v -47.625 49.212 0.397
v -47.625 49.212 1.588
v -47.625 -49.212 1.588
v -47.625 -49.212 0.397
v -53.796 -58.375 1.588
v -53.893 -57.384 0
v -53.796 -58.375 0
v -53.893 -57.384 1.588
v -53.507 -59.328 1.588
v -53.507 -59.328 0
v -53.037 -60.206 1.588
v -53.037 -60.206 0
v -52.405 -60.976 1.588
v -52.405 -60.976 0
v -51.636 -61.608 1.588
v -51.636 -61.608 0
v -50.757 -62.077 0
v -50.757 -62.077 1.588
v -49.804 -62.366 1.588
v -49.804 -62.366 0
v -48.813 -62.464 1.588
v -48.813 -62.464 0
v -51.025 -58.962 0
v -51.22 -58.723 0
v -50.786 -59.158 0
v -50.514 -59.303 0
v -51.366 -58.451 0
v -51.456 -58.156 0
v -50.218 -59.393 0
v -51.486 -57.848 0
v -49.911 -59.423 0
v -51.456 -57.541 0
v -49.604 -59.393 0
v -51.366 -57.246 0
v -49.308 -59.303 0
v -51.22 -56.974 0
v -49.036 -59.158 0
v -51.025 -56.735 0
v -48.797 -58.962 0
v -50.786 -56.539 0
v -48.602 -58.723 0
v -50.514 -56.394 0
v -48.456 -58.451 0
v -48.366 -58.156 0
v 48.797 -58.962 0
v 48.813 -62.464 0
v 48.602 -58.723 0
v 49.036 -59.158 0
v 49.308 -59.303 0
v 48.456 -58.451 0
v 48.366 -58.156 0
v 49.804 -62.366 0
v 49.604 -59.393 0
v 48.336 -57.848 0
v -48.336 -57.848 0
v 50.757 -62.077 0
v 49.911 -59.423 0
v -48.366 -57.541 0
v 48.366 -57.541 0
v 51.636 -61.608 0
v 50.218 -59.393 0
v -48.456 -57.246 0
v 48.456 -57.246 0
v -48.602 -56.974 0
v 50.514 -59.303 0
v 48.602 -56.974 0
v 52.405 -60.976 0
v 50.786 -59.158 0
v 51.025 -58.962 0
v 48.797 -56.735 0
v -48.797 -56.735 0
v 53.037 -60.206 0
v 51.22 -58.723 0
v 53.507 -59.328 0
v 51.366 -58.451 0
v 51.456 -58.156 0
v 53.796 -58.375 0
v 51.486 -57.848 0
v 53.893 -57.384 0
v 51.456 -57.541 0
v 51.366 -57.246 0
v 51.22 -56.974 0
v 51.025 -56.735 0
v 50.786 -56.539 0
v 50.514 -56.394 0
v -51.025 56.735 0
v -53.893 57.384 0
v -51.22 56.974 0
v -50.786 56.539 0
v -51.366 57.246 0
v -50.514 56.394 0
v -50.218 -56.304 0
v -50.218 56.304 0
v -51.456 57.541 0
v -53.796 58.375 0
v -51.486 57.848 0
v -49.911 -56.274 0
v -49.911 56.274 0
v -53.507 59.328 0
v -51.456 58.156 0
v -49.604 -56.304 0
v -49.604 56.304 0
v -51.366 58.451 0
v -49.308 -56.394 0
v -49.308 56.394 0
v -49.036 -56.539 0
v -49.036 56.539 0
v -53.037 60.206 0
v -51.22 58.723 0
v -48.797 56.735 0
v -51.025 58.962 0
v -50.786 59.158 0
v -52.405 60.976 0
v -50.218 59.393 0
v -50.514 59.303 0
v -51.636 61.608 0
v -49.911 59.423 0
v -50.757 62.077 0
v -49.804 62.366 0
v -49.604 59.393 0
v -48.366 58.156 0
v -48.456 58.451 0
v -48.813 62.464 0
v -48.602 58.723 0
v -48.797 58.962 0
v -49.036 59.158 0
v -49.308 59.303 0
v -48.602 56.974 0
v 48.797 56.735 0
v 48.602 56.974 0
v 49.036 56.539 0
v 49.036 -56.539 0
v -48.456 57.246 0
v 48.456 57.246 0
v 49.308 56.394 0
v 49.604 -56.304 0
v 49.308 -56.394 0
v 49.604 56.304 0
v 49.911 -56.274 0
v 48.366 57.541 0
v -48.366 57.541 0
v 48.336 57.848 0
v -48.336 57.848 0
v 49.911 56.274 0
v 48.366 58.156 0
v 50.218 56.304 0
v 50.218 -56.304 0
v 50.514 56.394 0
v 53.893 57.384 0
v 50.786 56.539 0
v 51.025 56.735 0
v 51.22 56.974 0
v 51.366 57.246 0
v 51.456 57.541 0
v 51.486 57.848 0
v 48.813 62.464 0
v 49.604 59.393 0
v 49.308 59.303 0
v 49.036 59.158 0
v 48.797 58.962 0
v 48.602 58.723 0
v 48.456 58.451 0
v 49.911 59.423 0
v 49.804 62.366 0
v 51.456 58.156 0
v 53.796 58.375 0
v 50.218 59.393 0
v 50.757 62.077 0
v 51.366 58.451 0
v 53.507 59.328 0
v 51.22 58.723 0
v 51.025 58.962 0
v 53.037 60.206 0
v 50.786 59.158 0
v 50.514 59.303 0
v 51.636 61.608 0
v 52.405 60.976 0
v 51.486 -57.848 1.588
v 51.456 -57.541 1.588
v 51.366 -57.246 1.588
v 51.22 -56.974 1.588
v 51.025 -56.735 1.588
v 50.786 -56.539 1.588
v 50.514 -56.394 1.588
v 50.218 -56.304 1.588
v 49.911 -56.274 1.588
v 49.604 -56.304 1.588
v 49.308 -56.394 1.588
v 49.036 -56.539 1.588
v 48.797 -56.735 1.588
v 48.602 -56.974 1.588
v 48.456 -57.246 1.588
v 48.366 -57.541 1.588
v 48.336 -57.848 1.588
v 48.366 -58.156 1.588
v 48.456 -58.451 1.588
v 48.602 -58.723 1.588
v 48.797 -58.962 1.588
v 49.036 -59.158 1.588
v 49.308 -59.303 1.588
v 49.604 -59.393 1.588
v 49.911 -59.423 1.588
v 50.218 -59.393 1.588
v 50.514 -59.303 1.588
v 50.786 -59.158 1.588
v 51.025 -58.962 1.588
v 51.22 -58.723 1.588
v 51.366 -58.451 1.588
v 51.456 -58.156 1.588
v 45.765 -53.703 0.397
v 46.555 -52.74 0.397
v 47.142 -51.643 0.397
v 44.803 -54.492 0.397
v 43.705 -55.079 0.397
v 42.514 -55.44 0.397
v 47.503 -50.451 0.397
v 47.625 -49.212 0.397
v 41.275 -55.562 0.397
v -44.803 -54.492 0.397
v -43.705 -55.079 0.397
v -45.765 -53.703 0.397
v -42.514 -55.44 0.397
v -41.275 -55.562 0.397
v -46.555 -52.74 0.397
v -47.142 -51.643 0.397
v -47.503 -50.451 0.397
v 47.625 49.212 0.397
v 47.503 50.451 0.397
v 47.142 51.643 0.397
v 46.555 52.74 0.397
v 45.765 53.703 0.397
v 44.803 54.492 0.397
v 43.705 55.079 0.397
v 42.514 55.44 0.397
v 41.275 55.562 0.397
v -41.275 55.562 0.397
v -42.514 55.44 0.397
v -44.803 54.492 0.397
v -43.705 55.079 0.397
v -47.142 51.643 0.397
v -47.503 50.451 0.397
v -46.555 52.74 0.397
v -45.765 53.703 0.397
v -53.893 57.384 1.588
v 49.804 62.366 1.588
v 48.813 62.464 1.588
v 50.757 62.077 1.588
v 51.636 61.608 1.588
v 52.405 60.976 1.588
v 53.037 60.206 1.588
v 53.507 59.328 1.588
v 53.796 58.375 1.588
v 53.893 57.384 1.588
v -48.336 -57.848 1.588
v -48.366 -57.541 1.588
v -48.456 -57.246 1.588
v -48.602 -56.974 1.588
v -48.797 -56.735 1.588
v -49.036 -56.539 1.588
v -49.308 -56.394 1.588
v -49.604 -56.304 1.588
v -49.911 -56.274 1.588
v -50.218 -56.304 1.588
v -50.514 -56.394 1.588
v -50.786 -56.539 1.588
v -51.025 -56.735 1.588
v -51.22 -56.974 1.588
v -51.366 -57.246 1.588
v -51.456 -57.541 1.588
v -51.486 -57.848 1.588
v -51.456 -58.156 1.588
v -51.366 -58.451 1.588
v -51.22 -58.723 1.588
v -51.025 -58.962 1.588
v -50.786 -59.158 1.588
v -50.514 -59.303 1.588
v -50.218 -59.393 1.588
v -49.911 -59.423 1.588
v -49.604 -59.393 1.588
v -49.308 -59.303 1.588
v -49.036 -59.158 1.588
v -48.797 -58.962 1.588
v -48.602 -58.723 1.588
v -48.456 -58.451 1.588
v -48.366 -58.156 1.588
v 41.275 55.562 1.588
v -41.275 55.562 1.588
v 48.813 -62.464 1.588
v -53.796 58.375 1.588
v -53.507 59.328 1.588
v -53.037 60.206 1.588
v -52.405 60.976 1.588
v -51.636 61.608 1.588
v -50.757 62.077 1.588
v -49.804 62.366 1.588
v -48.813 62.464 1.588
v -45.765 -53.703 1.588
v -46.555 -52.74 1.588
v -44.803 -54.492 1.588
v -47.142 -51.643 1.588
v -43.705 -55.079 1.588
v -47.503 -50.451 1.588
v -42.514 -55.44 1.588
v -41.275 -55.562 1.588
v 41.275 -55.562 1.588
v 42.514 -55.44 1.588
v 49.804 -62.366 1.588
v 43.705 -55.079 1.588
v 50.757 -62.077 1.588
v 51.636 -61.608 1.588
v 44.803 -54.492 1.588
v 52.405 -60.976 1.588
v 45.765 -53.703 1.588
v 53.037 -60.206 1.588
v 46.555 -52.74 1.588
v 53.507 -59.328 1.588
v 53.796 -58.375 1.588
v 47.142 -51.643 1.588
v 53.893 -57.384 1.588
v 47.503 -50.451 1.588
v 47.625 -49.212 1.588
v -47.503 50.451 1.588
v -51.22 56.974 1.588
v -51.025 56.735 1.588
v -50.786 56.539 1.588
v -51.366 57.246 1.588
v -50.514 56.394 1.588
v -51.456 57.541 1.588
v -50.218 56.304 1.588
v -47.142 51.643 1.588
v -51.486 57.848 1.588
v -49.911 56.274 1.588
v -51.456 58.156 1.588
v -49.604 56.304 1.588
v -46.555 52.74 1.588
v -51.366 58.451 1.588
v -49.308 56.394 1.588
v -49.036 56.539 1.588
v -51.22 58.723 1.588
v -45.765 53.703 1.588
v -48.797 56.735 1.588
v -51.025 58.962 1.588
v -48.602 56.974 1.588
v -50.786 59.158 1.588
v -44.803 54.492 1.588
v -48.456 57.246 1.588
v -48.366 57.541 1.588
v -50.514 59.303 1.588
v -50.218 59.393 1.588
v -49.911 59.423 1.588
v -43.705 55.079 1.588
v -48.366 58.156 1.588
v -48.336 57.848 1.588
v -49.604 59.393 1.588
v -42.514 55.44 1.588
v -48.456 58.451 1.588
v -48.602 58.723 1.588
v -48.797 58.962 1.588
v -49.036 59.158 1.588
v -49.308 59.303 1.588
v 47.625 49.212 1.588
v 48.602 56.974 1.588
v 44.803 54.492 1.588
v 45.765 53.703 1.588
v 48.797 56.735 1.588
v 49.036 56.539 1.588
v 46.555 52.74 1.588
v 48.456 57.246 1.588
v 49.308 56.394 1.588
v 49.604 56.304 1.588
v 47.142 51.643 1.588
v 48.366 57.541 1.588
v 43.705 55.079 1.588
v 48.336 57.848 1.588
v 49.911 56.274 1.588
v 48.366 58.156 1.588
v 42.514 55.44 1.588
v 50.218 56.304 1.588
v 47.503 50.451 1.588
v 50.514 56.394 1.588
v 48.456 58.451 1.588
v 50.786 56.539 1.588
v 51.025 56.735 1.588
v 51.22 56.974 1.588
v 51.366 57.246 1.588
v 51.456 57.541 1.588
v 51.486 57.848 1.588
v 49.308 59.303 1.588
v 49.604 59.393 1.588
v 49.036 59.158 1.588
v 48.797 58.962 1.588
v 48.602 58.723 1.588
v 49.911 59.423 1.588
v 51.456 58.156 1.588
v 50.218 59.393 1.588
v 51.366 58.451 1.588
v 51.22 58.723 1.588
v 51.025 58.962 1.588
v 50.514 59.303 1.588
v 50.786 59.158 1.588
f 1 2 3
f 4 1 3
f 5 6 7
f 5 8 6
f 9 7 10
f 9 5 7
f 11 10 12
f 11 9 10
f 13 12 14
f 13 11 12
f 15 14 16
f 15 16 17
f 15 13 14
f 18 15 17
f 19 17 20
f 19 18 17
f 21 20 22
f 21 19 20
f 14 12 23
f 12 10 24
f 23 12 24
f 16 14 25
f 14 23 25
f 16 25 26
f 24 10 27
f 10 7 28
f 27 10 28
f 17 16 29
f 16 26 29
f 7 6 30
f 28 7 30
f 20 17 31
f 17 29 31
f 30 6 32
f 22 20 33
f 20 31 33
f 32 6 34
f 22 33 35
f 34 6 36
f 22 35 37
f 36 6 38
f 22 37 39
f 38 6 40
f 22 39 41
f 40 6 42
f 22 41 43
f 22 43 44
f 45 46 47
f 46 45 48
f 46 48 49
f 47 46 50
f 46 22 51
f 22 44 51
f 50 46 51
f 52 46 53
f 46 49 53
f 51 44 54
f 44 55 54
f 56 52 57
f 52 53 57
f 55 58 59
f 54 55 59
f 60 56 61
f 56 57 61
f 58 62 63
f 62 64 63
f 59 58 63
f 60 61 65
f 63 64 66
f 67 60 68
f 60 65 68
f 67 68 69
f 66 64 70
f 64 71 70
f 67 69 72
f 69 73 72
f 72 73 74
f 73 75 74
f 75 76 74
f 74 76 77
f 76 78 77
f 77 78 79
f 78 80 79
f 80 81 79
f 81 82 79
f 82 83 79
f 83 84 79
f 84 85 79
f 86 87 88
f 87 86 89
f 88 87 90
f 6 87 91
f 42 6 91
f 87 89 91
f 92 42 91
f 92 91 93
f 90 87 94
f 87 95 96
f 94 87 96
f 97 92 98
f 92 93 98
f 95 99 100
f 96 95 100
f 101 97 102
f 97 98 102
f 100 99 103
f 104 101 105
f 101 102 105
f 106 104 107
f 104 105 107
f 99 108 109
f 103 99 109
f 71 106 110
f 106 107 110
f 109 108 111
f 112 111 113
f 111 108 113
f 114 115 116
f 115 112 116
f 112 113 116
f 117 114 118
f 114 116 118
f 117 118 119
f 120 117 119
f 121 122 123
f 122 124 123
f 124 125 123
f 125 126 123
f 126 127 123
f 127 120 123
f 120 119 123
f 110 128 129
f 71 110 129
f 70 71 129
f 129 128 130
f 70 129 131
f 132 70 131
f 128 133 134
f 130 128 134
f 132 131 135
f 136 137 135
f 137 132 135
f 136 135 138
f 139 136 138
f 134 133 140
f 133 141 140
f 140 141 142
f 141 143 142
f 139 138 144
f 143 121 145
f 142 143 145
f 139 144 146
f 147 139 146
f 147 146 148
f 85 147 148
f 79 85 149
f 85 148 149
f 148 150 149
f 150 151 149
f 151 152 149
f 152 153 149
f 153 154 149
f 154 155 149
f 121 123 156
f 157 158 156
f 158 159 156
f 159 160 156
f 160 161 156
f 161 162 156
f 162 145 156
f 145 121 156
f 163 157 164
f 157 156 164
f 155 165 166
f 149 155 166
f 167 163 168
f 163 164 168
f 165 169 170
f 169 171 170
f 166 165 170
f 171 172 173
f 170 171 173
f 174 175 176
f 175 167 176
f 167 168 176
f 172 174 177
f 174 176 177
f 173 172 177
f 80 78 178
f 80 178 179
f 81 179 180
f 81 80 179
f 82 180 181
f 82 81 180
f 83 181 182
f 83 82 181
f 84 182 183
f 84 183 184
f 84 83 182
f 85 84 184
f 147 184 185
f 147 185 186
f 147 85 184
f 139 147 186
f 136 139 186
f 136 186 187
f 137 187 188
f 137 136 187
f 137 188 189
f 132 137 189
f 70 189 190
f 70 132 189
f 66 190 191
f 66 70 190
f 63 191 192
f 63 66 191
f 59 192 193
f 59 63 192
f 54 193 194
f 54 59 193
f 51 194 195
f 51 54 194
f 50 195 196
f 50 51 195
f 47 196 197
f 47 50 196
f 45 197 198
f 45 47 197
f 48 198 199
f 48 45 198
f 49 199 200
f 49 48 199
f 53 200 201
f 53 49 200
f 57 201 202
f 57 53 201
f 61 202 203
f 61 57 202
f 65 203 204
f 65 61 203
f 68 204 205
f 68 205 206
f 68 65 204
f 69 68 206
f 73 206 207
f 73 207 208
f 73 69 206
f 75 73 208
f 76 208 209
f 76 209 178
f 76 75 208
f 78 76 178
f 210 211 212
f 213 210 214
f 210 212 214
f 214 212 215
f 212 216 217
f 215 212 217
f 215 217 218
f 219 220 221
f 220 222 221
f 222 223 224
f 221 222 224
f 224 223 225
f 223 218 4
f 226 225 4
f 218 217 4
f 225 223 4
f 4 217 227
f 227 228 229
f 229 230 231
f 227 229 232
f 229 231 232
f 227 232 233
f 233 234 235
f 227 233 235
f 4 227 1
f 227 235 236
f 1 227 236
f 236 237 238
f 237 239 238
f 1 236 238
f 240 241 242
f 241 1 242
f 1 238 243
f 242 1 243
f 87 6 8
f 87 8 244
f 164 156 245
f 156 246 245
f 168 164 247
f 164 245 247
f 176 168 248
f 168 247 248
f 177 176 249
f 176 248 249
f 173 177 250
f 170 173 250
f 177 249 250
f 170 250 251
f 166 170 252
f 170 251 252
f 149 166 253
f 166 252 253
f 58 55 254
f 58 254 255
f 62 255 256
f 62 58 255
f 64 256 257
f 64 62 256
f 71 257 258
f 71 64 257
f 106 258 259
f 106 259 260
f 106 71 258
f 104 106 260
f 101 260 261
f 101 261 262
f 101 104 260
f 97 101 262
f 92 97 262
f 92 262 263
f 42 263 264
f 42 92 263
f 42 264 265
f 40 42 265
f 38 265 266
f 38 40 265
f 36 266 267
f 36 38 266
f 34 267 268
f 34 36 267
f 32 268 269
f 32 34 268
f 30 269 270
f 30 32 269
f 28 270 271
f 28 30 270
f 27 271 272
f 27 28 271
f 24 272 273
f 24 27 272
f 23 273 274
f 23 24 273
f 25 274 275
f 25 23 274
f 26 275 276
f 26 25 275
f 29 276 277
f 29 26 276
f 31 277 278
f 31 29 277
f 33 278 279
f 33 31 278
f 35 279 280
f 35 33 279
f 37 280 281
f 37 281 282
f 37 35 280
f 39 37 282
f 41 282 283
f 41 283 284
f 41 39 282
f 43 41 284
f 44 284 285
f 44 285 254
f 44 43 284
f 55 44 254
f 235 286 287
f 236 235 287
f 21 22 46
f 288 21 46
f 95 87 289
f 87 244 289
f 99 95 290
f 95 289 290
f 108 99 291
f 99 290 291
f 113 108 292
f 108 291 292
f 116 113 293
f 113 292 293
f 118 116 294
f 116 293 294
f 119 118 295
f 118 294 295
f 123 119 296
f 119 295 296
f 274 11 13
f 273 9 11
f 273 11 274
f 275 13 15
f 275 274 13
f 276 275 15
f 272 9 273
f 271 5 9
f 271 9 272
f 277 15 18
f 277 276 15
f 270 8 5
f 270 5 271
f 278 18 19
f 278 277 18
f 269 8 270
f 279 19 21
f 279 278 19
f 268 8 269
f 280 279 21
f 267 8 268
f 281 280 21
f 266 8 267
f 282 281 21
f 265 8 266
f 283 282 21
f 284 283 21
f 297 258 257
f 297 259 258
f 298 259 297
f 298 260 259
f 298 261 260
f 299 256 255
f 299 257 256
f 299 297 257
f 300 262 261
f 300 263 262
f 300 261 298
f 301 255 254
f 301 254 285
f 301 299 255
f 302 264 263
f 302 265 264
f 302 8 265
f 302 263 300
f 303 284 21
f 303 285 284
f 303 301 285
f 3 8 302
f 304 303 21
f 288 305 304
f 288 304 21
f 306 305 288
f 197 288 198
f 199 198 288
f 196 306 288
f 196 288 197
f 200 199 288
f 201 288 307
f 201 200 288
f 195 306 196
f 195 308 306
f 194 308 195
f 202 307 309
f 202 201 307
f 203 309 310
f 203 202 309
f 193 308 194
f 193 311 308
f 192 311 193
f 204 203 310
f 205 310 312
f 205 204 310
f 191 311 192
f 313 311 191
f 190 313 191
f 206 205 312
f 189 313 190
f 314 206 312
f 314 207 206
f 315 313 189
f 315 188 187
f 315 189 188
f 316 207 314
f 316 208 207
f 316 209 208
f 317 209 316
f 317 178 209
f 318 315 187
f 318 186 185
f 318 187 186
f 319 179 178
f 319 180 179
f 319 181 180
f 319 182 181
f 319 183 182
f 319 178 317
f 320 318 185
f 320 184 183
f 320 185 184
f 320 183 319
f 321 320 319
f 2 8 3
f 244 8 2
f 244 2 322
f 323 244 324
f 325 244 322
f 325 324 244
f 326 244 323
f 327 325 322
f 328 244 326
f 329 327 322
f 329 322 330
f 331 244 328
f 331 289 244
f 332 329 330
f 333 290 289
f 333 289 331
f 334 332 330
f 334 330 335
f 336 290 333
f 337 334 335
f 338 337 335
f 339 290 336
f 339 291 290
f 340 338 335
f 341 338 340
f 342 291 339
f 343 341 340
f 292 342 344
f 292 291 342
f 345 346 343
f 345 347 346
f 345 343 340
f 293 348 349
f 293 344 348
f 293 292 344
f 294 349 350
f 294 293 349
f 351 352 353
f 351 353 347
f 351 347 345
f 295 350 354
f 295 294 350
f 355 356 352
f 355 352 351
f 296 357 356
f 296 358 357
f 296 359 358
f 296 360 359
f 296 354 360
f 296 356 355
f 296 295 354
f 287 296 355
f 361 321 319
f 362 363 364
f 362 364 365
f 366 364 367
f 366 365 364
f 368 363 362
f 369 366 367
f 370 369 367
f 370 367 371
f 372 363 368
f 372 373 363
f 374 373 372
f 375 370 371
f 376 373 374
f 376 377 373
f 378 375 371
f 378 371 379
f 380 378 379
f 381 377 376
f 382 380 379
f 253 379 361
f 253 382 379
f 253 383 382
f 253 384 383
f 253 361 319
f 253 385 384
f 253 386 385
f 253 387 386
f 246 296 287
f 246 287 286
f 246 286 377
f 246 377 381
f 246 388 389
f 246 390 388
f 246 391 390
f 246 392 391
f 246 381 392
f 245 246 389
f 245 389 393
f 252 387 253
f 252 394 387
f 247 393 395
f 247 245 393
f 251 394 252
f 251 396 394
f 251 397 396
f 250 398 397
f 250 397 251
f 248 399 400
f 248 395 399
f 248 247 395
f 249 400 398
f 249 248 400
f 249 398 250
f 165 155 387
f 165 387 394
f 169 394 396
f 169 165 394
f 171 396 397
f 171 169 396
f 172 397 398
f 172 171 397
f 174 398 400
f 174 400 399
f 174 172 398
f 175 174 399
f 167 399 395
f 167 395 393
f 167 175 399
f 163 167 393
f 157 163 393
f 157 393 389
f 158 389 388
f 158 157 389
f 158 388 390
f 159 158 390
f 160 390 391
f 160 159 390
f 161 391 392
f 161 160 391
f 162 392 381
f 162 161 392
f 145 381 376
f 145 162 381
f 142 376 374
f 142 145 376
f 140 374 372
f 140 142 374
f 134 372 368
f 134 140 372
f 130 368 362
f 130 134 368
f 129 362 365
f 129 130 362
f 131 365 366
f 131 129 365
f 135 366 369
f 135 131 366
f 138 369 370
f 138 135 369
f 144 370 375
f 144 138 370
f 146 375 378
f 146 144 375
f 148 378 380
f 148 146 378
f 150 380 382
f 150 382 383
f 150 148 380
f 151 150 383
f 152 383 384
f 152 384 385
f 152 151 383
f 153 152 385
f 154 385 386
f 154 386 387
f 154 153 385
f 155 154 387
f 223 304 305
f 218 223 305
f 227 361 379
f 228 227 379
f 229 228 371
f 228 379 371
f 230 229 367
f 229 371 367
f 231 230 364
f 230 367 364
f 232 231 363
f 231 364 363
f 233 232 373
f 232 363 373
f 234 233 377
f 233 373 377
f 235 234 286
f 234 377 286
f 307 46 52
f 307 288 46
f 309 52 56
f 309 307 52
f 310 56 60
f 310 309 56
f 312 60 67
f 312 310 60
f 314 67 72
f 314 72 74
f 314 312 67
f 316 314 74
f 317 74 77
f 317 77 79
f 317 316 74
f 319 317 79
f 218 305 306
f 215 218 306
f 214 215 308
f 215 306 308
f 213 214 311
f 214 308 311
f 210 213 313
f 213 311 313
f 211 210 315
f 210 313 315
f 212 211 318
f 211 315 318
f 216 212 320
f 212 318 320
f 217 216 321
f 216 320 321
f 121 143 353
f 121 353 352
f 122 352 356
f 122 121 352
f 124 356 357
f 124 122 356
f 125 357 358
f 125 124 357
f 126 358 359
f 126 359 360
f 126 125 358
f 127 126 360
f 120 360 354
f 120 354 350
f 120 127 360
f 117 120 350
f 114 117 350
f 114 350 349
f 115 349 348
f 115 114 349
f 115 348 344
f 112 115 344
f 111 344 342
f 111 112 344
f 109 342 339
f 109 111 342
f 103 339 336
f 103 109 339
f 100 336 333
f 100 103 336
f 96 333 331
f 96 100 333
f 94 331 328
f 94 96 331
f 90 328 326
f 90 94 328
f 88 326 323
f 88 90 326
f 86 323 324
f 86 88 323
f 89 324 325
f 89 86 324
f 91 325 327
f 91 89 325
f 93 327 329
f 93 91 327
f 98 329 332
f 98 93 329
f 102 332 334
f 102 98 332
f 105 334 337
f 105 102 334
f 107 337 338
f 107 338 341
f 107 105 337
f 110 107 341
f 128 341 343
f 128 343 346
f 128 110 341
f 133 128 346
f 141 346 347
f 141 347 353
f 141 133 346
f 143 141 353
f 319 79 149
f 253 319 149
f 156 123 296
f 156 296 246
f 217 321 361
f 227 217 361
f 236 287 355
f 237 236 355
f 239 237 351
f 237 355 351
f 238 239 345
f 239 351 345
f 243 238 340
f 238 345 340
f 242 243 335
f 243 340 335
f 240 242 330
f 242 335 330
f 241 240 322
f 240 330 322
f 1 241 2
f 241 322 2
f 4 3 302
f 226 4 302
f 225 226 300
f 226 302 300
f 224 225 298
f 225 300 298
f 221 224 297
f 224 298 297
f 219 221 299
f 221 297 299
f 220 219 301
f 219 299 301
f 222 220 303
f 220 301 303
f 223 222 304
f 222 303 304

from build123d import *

# Parameters (mm, degrees)
SKETCH1_W           = 107.786447668
SKETCH1_H           = 124.928058302
SKETCH1_R           = 1.5748
BOSS_EXTRUDE1_DEPTH = 1.5875
FILLET1_R           = 5.08
CUT_EXTRUDE1_DEPTH  = 83.515178417
SKETCH6_W           = 95.25
SKETCH6_H           = 111.125
BOSS_EXTRUDE2_DEPTH = 0.396875


with BuildPart() as part:
    # Sketch1 → Boss-Extrude1 (new body)
    with BuildSketch(Plane.XY):
        Rectangle(SKETCH1_W, SKETCH1_H)
        with Locations((-49.911, 57.8485)):
            Circle(SKETCH1_R, mode=Mode.SUBTRACT)
        with Locations((49.911, 57.8485)):
            Circle(SKETCH1_R, mode=Mode.SUBTRACT)
        with Locations((49.911, -57.8485)):
            Circle(SKETCH1_R, mode=Mode.SUBTRACT)
        with Locations((-49.911, -57.8485)):
            Circle(SKETCH1_R, mode=Mode.SUBTRACT)
    extrude(amount=BOSS_EXTRUDE1_DEPTH)

    # Fillet1
    fillet1_edges = [part.edges().sort_by_distance(p)[0] for p in [
        (-53.893223834, 62.464029151, 0.79375),
        (53.893223834, 62.464029151, 0.79375),
        (53.893223834, -62.464029151, 0.79375),
        (-53.893223834, -62.464029151, 0.79375),
    ]]
    fillet(fillet1_edges, radius=FILLET1_R)

    # Sketch4 → Cut-Extrude1 (cut, through all)
    with BuildSketch(Plane.XY.offset(1.5875)):
        with BuildLine():
            Line((41.275, 55.5625), (-41.275, 55.5625))
            ThreePointArc((-41.275, 55.5625), (-45.765128061, 53.702628061), (-47.625, 49.2125))
            Line((-47.625, 49.2125), (-47.625, -49.2125))
            ThreePointArc((-47.625, -49.2125), (-45.765128061, -53.702628061), (-41.275, -55.5625))
            Line((-41.275, -55.5625), (41.275, -55.5625))
            ThreePointArc((41.275, -55.5625), (45.765128061, -53.702628061), (47.625, -49.2125))
            Line((47.625, -49.2125), (47.625, 49.2125))
            ThreePointArc((47.625, 49.2125), (45.765128061, 53.702628061), (41.275, 55.5625))
        make_face()
    extrude(amount=-CUT_EXTRUDE1_DEPTH, mode=Mode.SUBTRACT)

    # Sketch6 → Boss-Extrude2 (add)
    with BuildSketch(Plane(origin=(0, 0, 0), x_dir=(-1, 0, 0), z_dir=(0, 0, -1))):
        Rectangle(SKETCH6_W, SKETCH6_H)
    extrude(amount=-BOSS_EXTRUDE2_DEPTH)


solid = part.part
